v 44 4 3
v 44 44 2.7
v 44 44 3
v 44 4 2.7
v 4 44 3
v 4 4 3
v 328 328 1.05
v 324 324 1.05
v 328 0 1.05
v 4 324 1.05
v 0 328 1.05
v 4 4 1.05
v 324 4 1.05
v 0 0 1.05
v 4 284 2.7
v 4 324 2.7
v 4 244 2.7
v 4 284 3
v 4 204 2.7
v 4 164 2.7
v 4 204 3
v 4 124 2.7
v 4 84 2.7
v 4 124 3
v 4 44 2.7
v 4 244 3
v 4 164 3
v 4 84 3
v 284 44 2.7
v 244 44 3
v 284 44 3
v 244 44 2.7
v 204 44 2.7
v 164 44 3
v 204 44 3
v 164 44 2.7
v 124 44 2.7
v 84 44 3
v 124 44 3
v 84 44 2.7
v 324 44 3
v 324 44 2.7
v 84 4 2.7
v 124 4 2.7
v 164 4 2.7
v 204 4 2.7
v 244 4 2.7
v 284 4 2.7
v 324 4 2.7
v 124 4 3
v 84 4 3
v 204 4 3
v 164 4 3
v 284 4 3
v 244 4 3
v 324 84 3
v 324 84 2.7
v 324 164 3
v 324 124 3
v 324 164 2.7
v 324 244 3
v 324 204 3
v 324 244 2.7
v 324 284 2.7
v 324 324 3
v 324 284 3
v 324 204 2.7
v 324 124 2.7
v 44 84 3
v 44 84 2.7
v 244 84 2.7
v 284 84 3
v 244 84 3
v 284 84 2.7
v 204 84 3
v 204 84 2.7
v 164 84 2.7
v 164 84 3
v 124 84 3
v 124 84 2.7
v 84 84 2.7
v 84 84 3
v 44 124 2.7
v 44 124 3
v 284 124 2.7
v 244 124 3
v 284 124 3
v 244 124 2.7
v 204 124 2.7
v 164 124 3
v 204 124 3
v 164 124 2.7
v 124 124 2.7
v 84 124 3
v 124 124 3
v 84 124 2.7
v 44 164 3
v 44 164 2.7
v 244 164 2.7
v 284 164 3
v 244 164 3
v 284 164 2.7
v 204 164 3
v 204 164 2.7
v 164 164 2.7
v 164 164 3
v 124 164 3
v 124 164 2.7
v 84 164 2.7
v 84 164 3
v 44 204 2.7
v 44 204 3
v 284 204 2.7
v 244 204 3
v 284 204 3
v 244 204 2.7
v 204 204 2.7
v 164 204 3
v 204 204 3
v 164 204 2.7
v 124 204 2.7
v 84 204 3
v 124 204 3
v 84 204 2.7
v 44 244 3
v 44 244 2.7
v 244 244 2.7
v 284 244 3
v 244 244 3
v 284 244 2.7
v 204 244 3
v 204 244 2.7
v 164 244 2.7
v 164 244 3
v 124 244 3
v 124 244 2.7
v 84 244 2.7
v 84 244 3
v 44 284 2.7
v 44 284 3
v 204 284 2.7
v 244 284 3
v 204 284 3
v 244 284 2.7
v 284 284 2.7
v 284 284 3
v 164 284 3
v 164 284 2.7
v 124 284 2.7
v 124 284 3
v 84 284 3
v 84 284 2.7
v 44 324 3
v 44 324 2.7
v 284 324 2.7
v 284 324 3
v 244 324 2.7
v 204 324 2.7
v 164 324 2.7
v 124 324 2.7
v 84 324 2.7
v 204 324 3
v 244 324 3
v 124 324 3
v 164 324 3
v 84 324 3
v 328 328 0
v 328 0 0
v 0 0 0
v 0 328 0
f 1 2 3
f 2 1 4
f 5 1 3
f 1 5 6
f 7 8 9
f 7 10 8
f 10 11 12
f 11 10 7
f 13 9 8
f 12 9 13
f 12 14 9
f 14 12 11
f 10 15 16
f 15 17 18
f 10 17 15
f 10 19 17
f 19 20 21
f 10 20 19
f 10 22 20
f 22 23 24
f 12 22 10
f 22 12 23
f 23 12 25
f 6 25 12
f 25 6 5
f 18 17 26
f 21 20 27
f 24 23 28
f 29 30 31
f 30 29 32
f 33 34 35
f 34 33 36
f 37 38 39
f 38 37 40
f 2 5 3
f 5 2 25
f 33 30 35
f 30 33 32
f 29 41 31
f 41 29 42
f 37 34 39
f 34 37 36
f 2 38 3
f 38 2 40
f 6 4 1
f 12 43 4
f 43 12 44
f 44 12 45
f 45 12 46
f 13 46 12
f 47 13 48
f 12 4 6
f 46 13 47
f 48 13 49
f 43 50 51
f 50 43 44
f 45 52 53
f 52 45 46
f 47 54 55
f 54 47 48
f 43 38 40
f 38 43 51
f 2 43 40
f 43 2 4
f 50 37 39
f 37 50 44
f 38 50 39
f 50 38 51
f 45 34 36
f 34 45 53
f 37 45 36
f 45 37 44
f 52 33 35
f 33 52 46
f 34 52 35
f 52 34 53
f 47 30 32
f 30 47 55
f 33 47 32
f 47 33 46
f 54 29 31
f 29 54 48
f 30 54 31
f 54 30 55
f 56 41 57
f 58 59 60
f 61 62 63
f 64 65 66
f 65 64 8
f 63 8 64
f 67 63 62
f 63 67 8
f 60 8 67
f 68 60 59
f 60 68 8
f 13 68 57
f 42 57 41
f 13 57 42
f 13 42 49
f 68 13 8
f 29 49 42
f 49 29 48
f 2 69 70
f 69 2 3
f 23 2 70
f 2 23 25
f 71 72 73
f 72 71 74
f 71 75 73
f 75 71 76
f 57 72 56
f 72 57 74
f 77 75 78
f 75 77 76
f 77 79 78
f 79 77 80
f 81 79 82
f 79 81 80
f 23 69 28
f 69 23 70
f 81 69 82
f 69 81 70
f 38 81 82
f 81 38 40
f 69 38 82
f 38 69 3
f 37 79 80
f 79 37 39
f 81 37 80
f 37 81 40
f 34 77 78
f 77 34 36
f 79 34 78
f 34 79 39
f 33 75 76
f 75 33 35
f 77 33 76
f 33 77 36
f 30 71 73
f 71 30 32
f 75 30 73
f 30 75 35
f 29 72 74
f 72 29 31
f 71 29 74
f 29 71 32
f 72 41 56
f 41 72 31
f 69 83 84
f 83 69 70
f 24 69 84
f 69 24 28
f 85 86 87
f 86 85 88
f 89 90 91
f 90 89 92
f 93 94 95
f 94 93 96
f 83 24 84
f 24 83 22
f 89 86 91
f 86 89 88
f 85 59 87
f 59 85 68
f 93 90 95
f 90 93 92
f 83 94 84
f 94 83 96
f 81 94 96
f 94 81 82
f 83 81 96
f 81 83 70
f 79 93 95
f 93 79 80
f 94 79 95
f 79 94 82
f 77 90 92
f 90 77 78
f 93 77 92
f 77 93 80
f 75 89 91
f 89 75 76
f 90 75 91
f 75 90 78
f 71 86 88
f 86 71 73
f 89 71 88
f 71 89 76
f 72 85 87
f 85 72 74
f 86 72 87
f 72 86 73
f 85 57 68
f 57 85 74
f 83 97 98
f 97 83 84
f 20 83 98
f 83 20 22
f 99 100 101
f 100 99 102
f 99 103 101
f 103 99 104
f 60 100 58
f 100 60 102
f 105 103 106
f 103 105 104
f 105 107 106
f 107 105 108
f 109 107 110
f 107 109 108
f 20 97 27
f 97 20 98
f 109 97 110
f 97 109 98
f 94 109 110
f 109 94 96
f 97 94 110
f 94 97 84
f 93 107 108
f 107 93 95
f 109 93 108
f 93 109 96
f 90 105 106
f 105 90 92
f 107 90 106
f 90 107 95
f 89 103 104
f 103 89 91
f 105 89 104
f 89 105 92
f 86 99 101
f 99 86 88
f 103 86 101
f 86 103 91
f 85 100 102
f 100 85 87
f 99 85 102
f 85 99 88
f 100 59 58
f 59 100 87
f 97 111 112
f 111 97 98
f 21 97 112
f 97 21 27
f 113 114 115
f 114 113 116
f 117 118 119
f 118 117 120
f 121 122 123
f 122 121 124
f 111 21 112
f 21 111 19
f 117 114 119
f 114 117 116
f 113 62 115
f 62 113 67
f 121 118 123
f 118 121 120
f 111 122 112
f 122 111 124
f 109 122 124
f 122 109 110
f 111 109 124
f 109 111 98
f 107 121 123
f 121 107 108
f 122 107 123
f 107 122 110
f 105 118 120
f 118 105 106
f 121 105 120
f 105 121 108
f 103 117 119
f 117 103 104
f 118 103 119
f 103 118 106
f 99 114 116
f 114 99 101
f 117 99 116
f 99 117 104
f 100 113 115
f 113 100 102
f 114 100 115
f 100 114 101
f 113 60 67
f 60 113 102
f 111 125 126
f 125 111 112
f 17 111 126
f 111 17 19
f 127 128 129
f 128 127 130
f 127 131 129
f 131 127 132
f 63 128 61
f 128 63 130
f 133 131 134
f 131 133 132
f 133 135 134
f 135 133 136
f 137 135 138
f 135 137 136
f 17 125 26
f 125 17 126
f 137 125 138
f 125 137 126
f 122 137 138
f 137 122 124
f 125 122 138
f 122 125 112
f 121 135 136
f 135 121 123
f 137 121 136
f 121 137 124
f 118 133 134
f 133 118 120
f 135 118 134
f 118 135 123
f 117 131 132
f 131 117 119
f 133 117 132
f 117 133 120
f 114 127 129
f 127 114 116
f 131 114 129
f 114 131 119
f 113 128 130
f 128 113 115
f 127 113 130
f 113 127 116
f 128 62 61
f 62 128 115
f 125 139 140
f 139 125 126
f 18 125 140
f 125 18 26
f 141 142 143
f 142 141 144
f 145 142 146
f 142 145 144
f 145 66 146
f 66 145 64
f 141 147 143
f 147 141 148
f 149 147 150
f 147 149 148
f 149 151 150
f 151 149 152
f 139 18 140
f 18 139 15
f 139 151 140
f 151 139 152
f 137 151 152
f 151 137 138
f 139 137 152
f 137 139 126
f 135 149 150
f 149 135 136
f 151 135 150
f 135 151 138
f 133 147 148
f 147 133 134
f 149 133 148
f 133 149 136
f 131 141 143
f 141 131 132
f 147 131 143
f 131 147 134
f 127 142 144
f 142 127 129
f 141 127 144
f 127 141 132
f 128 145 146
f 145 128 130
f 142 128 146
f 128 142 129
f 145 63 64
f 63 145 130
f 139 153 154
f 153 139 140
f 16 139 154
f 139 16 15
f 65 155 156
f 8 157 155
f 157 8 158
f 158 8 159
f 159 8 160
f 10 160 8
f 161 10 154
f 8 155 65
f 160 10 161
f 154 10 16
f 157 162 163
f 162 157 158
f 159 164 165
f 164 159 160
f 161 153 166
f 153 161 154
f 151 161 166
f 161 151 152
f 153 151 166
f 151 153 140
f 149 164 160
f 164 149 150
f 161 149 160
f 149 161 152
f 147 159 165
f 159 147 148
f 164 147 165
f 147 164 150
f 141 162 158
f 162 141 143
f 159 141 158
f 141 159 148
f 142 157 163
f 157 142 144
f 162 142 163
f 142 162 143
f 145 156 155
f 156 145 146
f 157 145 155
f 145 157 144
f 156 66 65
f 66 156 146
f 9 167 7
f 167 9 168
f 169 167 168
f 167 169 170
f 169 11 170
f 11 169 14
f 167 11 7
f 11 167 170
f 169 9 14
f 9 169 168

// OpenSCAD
// Fixture: parametric chess board (flat, printable)
// E2E proof asset — Meshy-free pipeline (OpenSCAD → STL → Blender GLB)
// Z = vertical; board sits on XY plane.

square = 40;       // mm per square
rows = 8;
cols = 8;
thickness = 3;
border = 4;

board_w = cols * square + 2 * border;
board_d = rows * square + 2 * border;

// Single solid: base slab + 64 alternating tile prisms (checker visual via height steps)
union() {
  color([0.25, 0.22, 0.2])
    cube([board_w, board_d, thickness * 0.35]);
  for (r = [0 : rows - 1])
    for (c = [0 : cols - 1]) {
      cx = border + c * square;
      cy = border + r * square;
      light = ((r + c) % 2) == 0;
      z0 = thickness * 0.35;
      h = light ? thickness * 0.65 : thickness * 0.55;
      color(light ? [0.92, 0.9, 0.85] : [0.18, 0.15, 0.13])
        translate([cx, cy, z0])
          cube([square, square, h]);
    }
}
